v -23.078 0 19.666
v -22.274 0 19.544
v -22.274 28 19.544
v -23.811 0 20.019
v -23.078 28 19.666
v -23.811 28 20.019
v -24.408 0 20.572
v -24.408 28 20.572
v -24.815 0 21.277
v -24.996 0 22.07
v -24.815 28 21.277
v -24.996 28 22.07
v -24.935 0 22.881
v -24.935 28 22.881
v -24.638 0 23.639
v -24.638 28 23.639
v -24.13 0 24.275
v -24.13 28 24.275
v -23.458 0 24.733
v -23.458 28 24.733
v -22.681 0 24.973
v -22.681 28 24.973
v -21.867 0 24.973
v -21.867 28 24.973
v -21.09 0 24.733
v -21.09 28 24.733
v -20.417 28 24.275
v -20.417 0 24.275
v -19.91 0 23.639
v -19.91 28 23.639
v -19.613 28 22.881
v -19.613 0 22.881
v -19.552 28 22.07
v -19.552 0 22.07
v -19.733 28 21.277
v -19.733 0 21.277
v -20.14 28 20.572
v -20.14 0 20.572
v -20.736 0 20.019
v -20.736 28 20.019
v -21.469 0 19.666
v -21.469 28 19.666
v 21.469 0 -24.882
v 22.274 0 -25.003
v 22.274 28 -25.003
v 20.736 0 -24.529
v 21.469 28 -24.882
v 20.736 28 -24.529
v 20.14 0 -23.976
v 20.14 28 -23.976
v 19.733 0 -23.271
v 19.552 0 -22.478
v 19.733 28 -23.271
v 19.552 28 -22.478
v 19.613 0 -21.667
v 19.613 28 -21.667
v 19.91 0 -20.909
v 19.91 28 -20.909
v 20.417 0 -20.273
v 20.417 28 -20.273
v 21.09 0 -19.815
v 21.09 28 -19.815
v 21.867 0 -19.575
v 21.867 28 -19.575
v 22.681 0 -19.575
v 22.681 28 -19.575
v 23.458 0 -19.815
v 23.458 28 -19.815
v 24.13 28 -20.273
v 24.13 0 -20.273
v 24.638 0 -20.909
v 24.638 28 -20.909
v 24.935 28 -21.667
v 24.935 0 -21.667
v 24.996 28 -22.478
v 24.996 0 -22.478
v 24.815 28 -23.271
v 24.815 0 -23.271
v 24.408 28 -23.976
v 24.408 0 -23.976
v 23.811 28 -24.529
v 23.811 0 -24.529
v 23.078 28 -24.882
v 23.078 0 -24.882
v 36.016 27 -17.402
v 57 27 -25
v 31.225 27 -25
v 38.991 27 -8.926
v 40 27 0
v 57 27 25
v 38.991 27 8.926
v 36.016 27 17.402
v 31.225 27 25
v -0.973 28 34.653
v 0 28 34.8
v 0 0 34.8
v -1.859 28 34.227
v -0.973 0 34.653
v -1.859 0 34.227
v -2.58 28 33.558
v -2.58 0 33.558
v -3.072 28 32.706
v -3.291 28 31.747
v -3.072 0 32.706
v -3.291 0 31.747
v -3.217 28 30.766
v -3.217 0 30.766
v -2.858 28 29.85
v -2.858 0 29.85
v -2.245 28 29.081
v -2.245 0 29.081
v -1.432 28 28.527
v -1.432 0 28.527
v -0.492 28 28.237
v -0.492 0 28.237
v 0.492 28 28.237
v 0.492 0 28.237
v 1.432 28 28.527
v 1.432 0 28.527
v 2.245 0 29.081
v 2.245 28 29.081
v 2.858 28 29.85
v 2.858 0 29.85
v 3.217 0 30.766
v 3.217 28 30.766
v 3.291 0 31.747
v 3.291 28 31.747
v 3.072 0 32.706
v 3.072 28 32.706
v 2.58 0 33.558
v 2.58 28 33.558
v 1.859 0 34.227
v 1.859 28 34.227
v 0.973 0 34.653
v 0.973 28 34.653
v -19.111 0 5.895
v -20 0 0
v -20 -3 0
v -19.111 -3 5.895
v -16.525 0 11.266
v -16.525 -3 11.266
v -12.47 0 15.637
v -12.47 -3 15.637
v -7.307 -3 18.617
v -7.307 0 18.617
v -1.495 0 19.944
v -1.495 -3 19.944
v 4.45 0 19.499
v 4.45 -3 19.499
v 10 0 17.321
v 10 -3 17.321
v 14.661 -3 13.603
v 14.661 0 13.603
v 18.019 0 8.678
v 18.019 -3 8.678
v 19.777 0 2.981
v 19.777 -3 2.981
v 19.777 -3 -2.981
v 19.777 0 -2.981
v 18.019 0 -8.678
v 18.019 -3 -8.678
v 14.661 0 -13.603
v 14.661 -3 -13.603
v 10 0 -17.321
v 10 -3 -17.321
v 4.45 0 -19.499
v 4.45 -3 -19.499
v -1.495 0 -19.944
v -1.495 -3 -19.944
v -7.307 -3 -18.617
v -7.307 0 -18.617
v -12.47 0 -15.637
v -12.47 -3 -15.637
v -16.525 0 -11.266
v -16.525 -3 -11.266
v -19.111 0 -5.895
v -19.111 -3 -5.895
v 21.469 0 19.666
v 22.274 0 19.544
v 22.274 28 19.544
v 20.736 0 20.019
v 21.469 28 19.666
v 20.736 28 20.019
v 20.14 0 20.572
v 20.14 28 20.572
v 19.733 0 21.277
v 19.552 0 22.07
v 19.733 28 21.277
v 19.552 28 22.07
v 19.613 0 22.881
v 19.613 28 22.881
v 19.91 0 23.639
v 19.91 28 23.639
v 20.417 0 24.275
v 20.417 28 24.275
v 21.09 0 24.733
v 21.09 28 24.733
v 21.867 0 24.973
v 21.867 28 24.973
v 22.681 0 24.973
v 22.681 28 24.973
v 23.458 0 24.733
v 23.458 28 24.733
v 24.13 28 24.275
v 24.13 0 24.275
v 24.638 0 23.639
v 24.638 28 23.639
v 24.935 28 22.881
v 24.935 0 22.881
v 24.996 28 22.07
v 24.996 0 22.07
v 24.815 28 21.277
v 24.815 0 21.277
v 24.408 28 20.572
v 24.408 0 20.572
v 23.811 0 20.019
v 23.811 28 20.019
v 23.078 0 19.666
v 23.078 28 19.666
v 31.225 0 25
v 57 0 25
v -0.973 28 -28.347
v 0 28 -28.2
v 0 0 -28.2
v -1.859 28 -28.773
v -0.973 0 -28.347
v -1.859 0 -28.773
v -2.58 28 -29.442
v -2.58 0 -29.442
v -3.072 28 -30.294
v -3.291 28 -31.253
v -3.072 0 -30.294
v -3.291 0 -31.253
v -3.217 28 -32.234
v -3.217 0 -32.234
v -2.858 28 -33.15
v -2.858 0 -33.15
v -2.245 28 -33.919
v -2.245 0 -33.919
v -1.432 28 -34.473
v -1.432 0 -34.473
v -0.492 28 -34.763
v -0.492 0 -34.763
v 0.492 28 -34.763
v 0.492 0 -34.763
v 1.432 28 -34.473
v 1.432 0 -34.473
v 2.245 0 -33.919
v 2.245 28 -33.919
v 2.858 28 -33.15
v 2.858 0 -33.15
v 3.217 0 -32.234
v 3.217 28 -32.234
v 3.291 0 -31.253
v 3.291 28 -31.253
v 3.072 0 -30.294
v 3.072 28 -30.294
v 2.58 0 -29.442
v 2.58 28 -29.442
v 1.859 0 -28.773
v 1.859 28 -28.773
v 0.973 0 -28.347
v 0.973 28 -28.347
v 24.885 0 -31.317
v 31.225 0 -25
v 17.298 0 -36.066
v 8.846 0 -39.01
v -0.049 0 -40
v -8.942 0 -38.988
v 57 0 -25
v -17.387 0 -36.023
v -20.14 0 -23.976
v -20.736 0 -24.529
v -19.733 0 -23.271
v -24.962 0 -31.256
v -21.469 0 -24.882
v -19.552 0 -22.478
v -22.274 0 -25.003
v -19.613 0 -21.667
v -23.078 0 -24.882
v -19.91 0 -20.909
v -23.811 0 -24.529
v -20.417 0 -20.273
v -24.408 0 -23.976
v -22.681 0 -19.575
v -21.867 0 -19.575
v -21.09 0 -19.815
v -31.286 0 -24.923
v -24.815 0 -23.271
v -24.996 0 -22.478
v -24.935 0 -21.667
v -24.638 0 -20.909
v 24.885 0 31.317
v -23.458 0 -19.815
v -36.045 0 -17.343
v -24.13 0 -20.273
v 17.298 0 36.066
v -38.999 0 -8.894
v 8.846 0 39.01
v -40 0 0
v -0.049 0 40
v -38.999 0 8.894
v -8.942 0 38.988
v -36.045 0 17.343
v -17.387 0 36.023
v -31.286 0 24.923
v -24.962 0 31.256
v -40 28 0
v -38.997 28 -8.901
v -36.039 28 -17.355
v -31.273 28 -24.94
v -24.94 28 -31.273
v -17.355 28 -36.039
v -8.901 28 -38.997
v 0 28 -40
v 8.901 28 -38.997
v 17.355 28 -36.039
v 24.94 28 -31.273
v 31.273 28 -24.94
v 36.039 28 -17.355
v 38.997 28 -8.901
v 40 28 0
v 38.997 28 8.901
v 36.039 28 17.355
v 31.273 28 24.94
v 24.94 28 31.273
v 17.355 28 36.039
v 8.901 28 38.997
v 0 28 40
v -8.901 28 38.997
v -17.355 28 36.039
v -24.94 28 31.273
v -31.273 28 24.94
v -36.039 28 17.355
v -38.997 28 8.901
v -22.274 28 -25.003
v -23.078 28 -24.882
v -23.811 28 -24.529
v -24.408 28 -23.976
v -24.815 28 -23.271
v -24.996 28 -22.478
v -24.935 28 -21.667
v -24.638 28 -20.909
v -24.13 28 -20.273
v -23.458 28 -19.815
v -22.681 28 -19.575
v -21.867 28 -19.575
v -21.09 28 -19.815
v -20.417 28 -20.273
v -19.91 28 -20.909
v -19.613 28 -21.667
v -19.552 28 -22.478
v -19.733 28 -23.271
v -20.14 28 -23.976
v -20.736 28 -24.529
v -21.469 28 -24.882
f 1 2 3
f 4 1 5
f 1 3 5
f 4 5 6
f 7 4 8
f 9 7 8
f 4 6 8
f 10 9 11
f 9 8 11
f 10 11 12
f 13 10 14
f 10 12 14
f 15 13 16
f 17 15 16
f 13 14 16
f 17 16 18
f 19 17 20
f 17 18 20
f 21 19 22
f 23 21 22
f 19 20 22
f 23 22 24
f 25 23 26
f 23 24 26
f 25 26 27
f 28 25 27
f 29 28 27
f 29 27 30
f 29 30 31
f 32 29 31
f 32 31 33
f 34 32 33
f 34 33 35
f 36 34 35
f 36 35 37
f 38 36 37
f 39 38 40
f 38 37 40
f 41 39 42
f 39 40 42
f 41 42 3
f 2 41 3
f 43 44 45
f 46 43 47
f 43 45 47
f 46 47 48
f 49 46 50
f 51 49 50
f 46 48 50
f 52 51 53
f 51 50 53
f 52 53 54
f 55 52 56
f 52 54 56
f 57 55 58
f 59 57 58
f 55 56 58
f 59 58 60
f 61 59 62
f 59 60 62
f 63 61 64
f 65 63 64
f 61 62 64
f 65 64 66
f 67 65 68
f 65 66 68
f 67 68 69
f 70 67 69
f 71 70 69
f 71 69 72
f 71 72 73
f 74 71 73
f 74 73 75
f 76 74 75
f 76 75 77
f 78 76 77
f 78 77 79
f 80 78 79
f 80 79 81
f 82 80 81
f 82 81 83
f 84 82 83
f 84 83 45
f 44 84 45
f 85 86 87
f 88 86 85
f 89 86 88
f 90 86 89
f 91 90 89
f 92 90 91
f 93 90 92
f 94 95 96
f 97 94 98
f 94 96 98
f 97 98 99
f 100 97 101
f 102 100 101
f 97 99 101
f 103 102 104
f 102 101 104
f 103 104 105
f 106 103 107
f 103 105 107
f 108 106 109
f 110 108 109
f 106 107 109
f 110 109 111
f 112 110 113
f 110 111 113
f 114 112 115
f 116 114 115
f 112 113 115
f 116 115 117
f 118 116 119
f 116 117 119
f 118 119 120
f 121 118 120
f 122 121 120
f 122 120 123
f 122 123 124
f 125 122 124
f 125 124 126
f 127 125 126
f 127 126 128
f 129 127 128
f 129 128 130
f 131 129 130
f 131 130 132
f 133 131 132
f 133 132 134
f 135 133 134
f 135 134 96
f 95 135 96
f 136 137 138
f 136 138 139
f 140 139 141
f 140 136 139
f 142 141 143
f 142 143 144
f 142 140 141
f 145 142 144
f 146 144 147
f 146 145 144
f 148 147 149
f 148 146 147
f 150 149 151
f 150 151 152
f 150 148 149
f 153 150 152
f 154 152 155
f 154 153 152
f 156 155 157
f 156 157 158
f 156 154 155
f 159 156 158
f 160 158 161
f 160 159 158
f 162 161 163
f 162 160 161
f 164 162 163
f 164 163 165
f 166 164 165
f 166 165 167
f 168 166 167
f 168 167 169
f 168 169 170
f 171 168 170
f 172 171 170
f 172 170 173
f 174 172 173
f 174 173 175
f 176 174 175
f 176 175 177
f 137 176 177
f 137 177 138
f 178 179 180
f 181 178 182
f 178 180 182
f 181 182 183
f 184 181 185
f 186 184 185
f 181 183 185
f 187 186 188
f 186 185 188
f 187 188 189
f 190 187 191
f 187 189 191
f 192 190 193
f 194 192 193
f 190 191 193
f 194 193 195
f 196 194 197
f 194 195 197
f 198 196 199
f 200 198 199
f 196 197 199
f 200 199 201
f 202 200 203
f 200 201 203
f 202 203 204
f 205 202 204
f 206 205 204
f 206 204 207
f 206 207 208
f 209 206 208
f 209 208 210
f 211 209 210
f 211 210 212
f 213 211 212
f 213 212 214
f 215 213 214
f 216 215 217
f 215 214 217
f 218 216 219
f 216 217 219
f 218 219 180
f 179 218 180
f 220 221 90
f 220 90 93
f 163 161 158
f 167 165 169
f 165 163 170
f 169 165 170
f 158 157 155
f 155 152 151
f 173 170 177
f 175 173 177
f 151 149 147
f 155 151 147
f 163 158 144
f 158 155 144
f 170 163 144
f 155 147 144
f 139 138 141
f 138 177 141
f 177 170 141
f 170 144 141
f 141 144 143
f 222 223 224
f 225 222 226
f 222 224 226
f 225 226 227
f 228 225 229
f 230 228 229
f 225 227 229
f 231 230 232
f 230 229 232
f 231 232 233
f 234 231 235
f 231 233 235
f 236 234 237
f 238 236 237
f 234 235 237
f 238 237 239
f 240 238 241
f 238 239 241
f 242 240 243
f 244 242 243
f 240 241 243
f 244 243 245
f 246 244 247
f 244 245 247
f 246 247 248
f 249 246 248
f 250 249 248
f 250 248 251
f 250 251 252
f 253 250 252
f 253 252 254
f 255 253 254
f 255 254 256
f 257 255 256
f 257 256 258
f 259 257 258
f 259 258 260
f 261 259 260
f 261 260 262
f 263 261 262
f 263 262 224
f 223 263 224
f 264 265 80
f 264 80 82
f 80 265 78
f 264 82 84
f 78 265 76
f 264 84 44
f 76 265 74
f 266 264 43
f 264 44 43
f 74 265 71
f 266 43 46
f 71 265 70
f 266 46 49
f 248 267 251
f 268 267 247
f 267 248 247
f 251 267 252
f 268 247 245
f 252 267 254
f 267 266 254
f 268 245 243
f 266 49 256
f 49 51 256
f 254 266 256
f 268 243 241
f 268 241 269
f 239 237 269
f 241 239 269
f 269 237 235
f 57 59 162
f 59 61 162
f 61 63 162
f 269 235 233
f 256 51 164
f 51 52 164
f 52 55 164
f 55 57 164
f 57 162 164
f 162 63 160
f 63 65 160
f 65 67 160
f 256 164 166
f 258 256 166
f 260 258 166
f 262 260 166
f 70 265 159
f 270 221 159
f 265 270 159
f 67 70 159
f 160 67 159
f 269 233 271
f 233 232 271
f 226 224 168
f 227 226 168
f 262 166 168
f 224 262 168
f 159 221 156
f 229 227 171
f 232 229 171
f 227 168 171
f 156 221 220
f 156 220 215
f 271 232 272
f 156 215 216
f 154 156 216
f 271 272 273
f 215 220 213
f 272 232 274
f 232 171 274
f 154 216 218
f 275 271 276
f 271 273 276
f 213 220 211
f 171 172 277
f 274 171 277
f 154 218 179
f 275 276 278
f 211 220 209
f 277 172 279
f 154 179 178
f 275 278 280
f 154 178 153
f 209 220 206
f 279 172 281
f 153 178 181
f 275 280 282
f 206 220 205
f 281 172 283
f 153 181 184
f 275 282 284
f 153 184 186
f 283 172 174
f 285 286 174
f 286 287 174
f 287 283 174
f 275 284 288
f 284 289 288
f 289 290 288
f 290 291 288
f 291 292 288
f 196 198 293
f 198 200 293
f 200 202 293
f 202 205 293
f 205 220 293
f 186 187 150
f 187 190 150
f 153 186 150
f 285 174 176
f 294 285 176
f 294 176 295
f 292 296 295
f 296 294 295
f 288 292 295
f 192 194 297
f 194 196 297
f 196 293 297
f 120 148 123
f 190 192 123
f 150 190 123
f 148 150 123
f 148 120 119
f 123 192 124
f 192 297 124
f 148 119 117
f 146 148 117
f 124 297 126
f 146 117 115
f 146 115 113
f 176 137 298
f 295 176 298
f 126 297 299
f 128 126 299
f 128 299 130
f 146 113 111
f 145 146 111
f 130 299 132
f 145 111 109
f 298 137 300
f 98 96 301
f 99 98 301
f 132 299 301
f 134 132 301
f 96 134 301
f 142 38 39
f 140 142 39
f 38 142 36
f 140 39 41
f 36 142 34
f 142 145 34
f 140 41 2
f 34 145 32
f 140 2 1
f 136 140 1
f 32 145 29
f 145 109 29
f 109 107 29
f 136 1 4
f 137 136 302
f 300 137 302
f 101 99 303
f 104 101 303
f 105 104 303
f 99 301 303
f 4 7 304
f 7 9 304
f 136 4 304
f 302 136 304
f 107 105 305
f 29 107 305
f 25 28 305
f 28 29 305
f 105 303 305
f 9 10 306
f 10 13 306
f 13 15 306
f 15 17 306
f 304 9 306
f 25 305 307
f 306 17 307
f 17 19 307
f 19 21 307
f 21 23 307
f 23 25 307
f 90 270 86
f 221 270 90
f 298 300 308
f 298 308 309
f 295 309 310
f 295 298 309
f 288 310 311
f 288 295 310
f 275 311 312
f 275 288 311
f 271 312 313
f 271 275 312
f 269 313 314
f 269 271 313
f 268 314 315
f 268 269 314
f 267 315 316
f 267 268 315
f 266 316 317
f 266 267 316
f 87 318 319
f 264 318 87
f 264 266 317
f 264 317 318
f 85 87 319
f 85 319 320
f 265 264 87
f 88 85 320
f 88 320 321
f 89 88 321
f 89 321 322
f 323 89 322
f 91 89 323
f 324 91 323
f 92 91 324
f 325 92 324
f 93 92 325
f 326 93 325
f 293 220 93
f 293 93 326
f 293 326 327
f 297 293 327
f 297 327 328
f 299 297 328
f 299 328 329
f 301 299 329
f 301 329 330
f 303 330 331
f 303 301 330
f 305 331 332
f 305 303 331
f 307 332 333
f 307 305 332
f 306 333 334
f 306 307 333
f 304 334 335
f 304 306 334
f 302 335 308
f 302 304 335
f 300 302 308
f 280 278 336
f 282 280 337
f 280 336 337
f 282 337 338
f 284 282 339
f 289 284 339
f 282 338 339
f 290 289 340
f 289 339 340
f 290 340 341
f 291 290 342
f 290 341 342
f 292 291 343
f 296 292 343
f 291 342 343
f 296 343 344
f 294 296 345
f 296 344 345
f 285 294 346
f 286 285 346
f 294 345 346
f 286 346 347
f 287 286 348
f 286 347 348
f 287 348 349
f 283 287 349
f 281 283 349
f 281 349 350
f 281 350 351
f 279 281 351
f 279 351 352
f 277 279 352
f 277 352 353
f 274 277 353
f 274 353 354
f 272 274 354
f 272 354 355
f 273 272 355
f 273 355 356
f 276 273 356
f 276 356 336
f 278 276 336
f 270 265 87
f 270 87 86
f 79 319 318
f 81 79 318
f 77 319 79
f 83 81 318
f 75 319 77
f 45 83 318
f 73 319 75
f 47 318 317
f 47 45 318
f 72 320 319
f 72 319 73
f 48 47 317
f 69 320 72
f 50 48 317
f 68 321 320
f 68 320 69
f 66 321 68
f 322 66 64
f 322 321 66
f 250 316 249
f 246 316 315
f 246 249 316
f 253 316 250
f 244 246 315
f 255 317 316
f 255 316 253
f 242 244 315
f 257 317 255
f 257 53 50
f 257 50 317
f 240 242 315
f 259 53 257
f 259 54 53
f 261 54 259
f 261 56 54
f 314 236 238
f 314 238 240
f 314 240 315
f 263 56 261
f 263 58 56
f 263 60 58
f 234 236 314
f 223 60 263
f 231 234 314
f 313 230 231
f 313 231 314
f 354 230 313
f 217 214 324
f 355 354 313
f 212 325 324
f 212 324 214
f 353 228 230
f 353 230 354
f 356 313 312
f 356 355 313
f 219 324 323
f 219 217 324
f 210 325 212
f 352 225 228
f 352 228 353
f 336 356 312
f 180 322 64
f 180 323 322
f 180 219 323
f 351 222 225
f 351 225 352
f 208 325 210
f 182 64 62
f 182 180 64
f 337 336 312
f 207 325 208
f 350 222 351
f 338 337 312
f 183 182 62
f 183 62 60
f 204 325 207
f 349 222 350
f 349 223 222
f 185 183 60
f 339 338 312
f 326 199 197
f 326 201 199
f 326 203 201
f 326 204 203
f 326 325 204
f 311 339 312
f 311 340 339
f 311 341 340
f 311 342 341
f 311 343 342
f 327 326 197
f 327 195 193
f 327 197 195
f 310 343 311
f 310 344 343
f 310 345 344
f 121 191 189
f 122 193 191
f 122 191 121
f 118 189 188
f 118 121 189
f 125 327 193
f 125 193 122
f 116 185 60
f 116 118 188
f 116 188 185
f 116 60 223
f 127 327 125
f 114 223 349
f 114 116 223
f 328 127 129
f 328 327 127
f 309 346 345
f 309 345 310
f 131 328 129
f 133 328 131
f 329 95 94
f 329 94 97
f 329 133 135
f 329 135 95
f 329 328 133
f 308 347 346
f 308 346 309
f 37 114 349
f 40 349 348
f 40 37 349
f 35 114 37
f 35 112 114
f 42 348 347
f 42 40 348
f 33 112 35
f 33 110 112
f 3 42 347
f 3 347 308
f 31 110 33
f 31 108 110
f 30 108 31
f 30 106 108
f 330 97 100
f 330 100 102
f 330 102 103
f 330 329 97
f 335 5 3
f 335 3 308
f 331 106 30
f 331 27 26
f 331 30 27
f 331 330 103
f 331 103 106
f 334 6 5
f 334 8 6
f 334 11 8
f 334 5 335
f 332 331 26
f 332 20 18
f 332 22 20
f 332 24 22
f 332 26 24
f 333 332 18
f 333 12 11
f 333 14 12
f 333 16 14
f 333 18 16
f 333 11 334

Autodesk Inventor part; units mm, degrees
ref_plane "YZ Plane" through (0, 0, 0) normal (1, 0, 0) x (0, 1, 0)
ref_plane "XZ Plane" through (0, 0, 0) normal (0, 1, 0) x (-1, 0, 0)
ref_plane "XY Plane" through (0, 0, 0) normal (0, 0, 1) x (1, 0, 0)
sketch "Sketch1" plane through (0, 0, 0) normal (0, 1, 0) x (-1, 0, 0)
  circle A0 centre (0, 0) radius 40
  circle A1 centre (0, 0) radius 20
  line L0 (-57, 25) -> (-31.225, 25)
  line L1 (-31.225, -25) -> (-57, -25)
  line L2 (-57, -25) -> (-57, 25)
  point P0 (22.2739, 22.2739)
  point P1 (-22.2739, 22.2739)
  point P2 (-22.2739, -22.2739)
  point P3 (22.2739, -22.2739)
  dimension "d0" = 80
  dimension "d2" = 40
  dimension "d5" = 97
  dimension "d6" = 50
  dimension "d7" = 31.5
  dimension "d10" = 360
extrude "Extrusion1" add sketch "Sketch1" along normal blind 28 contours A0
extrude "Extrusion2" add sketch "Sketch1" along normal blind 28 contours A1
extrude "Extrusion3" add sketch "Sketch1" against normal blind 3 contours A1
extrude "Extrusion4" add sketch "Sketch1" along normal blind 27 contours A0 L1 L2 L0
hole "Hole1" at (-22.2739, 0, 22.2739) at (22.2739, 0, 22.2739) at (22.2739, 0, -22.2739) at (-22.2739, 0, -22.2739) direction (0, 1, 0) diameter 5.459 end through all thread size "M6x0.5" class "6H" standard "ANSI Metric M Profile"
sketch "Sketch2" plane through (0, 28, 0) normal (0, 1, 0) x (1, 0, 0)
  circle A0 centre (0, 0) radius 40 projected
  point P0 (0, 31.5)
  point P1 (0, -31.5)
  dimension "d27" = 31.5
  dimension "d30" = 360
hole "Hole2" at (0, 28, 31.5) at (0, 28, -31.5) direction (0, -1, 0) diameter 6.6 end through all clearance for "Hex Head Bolt" size "M6" standard "Ansi Metric M Profile"
properties part number "CFS080CA501U"
